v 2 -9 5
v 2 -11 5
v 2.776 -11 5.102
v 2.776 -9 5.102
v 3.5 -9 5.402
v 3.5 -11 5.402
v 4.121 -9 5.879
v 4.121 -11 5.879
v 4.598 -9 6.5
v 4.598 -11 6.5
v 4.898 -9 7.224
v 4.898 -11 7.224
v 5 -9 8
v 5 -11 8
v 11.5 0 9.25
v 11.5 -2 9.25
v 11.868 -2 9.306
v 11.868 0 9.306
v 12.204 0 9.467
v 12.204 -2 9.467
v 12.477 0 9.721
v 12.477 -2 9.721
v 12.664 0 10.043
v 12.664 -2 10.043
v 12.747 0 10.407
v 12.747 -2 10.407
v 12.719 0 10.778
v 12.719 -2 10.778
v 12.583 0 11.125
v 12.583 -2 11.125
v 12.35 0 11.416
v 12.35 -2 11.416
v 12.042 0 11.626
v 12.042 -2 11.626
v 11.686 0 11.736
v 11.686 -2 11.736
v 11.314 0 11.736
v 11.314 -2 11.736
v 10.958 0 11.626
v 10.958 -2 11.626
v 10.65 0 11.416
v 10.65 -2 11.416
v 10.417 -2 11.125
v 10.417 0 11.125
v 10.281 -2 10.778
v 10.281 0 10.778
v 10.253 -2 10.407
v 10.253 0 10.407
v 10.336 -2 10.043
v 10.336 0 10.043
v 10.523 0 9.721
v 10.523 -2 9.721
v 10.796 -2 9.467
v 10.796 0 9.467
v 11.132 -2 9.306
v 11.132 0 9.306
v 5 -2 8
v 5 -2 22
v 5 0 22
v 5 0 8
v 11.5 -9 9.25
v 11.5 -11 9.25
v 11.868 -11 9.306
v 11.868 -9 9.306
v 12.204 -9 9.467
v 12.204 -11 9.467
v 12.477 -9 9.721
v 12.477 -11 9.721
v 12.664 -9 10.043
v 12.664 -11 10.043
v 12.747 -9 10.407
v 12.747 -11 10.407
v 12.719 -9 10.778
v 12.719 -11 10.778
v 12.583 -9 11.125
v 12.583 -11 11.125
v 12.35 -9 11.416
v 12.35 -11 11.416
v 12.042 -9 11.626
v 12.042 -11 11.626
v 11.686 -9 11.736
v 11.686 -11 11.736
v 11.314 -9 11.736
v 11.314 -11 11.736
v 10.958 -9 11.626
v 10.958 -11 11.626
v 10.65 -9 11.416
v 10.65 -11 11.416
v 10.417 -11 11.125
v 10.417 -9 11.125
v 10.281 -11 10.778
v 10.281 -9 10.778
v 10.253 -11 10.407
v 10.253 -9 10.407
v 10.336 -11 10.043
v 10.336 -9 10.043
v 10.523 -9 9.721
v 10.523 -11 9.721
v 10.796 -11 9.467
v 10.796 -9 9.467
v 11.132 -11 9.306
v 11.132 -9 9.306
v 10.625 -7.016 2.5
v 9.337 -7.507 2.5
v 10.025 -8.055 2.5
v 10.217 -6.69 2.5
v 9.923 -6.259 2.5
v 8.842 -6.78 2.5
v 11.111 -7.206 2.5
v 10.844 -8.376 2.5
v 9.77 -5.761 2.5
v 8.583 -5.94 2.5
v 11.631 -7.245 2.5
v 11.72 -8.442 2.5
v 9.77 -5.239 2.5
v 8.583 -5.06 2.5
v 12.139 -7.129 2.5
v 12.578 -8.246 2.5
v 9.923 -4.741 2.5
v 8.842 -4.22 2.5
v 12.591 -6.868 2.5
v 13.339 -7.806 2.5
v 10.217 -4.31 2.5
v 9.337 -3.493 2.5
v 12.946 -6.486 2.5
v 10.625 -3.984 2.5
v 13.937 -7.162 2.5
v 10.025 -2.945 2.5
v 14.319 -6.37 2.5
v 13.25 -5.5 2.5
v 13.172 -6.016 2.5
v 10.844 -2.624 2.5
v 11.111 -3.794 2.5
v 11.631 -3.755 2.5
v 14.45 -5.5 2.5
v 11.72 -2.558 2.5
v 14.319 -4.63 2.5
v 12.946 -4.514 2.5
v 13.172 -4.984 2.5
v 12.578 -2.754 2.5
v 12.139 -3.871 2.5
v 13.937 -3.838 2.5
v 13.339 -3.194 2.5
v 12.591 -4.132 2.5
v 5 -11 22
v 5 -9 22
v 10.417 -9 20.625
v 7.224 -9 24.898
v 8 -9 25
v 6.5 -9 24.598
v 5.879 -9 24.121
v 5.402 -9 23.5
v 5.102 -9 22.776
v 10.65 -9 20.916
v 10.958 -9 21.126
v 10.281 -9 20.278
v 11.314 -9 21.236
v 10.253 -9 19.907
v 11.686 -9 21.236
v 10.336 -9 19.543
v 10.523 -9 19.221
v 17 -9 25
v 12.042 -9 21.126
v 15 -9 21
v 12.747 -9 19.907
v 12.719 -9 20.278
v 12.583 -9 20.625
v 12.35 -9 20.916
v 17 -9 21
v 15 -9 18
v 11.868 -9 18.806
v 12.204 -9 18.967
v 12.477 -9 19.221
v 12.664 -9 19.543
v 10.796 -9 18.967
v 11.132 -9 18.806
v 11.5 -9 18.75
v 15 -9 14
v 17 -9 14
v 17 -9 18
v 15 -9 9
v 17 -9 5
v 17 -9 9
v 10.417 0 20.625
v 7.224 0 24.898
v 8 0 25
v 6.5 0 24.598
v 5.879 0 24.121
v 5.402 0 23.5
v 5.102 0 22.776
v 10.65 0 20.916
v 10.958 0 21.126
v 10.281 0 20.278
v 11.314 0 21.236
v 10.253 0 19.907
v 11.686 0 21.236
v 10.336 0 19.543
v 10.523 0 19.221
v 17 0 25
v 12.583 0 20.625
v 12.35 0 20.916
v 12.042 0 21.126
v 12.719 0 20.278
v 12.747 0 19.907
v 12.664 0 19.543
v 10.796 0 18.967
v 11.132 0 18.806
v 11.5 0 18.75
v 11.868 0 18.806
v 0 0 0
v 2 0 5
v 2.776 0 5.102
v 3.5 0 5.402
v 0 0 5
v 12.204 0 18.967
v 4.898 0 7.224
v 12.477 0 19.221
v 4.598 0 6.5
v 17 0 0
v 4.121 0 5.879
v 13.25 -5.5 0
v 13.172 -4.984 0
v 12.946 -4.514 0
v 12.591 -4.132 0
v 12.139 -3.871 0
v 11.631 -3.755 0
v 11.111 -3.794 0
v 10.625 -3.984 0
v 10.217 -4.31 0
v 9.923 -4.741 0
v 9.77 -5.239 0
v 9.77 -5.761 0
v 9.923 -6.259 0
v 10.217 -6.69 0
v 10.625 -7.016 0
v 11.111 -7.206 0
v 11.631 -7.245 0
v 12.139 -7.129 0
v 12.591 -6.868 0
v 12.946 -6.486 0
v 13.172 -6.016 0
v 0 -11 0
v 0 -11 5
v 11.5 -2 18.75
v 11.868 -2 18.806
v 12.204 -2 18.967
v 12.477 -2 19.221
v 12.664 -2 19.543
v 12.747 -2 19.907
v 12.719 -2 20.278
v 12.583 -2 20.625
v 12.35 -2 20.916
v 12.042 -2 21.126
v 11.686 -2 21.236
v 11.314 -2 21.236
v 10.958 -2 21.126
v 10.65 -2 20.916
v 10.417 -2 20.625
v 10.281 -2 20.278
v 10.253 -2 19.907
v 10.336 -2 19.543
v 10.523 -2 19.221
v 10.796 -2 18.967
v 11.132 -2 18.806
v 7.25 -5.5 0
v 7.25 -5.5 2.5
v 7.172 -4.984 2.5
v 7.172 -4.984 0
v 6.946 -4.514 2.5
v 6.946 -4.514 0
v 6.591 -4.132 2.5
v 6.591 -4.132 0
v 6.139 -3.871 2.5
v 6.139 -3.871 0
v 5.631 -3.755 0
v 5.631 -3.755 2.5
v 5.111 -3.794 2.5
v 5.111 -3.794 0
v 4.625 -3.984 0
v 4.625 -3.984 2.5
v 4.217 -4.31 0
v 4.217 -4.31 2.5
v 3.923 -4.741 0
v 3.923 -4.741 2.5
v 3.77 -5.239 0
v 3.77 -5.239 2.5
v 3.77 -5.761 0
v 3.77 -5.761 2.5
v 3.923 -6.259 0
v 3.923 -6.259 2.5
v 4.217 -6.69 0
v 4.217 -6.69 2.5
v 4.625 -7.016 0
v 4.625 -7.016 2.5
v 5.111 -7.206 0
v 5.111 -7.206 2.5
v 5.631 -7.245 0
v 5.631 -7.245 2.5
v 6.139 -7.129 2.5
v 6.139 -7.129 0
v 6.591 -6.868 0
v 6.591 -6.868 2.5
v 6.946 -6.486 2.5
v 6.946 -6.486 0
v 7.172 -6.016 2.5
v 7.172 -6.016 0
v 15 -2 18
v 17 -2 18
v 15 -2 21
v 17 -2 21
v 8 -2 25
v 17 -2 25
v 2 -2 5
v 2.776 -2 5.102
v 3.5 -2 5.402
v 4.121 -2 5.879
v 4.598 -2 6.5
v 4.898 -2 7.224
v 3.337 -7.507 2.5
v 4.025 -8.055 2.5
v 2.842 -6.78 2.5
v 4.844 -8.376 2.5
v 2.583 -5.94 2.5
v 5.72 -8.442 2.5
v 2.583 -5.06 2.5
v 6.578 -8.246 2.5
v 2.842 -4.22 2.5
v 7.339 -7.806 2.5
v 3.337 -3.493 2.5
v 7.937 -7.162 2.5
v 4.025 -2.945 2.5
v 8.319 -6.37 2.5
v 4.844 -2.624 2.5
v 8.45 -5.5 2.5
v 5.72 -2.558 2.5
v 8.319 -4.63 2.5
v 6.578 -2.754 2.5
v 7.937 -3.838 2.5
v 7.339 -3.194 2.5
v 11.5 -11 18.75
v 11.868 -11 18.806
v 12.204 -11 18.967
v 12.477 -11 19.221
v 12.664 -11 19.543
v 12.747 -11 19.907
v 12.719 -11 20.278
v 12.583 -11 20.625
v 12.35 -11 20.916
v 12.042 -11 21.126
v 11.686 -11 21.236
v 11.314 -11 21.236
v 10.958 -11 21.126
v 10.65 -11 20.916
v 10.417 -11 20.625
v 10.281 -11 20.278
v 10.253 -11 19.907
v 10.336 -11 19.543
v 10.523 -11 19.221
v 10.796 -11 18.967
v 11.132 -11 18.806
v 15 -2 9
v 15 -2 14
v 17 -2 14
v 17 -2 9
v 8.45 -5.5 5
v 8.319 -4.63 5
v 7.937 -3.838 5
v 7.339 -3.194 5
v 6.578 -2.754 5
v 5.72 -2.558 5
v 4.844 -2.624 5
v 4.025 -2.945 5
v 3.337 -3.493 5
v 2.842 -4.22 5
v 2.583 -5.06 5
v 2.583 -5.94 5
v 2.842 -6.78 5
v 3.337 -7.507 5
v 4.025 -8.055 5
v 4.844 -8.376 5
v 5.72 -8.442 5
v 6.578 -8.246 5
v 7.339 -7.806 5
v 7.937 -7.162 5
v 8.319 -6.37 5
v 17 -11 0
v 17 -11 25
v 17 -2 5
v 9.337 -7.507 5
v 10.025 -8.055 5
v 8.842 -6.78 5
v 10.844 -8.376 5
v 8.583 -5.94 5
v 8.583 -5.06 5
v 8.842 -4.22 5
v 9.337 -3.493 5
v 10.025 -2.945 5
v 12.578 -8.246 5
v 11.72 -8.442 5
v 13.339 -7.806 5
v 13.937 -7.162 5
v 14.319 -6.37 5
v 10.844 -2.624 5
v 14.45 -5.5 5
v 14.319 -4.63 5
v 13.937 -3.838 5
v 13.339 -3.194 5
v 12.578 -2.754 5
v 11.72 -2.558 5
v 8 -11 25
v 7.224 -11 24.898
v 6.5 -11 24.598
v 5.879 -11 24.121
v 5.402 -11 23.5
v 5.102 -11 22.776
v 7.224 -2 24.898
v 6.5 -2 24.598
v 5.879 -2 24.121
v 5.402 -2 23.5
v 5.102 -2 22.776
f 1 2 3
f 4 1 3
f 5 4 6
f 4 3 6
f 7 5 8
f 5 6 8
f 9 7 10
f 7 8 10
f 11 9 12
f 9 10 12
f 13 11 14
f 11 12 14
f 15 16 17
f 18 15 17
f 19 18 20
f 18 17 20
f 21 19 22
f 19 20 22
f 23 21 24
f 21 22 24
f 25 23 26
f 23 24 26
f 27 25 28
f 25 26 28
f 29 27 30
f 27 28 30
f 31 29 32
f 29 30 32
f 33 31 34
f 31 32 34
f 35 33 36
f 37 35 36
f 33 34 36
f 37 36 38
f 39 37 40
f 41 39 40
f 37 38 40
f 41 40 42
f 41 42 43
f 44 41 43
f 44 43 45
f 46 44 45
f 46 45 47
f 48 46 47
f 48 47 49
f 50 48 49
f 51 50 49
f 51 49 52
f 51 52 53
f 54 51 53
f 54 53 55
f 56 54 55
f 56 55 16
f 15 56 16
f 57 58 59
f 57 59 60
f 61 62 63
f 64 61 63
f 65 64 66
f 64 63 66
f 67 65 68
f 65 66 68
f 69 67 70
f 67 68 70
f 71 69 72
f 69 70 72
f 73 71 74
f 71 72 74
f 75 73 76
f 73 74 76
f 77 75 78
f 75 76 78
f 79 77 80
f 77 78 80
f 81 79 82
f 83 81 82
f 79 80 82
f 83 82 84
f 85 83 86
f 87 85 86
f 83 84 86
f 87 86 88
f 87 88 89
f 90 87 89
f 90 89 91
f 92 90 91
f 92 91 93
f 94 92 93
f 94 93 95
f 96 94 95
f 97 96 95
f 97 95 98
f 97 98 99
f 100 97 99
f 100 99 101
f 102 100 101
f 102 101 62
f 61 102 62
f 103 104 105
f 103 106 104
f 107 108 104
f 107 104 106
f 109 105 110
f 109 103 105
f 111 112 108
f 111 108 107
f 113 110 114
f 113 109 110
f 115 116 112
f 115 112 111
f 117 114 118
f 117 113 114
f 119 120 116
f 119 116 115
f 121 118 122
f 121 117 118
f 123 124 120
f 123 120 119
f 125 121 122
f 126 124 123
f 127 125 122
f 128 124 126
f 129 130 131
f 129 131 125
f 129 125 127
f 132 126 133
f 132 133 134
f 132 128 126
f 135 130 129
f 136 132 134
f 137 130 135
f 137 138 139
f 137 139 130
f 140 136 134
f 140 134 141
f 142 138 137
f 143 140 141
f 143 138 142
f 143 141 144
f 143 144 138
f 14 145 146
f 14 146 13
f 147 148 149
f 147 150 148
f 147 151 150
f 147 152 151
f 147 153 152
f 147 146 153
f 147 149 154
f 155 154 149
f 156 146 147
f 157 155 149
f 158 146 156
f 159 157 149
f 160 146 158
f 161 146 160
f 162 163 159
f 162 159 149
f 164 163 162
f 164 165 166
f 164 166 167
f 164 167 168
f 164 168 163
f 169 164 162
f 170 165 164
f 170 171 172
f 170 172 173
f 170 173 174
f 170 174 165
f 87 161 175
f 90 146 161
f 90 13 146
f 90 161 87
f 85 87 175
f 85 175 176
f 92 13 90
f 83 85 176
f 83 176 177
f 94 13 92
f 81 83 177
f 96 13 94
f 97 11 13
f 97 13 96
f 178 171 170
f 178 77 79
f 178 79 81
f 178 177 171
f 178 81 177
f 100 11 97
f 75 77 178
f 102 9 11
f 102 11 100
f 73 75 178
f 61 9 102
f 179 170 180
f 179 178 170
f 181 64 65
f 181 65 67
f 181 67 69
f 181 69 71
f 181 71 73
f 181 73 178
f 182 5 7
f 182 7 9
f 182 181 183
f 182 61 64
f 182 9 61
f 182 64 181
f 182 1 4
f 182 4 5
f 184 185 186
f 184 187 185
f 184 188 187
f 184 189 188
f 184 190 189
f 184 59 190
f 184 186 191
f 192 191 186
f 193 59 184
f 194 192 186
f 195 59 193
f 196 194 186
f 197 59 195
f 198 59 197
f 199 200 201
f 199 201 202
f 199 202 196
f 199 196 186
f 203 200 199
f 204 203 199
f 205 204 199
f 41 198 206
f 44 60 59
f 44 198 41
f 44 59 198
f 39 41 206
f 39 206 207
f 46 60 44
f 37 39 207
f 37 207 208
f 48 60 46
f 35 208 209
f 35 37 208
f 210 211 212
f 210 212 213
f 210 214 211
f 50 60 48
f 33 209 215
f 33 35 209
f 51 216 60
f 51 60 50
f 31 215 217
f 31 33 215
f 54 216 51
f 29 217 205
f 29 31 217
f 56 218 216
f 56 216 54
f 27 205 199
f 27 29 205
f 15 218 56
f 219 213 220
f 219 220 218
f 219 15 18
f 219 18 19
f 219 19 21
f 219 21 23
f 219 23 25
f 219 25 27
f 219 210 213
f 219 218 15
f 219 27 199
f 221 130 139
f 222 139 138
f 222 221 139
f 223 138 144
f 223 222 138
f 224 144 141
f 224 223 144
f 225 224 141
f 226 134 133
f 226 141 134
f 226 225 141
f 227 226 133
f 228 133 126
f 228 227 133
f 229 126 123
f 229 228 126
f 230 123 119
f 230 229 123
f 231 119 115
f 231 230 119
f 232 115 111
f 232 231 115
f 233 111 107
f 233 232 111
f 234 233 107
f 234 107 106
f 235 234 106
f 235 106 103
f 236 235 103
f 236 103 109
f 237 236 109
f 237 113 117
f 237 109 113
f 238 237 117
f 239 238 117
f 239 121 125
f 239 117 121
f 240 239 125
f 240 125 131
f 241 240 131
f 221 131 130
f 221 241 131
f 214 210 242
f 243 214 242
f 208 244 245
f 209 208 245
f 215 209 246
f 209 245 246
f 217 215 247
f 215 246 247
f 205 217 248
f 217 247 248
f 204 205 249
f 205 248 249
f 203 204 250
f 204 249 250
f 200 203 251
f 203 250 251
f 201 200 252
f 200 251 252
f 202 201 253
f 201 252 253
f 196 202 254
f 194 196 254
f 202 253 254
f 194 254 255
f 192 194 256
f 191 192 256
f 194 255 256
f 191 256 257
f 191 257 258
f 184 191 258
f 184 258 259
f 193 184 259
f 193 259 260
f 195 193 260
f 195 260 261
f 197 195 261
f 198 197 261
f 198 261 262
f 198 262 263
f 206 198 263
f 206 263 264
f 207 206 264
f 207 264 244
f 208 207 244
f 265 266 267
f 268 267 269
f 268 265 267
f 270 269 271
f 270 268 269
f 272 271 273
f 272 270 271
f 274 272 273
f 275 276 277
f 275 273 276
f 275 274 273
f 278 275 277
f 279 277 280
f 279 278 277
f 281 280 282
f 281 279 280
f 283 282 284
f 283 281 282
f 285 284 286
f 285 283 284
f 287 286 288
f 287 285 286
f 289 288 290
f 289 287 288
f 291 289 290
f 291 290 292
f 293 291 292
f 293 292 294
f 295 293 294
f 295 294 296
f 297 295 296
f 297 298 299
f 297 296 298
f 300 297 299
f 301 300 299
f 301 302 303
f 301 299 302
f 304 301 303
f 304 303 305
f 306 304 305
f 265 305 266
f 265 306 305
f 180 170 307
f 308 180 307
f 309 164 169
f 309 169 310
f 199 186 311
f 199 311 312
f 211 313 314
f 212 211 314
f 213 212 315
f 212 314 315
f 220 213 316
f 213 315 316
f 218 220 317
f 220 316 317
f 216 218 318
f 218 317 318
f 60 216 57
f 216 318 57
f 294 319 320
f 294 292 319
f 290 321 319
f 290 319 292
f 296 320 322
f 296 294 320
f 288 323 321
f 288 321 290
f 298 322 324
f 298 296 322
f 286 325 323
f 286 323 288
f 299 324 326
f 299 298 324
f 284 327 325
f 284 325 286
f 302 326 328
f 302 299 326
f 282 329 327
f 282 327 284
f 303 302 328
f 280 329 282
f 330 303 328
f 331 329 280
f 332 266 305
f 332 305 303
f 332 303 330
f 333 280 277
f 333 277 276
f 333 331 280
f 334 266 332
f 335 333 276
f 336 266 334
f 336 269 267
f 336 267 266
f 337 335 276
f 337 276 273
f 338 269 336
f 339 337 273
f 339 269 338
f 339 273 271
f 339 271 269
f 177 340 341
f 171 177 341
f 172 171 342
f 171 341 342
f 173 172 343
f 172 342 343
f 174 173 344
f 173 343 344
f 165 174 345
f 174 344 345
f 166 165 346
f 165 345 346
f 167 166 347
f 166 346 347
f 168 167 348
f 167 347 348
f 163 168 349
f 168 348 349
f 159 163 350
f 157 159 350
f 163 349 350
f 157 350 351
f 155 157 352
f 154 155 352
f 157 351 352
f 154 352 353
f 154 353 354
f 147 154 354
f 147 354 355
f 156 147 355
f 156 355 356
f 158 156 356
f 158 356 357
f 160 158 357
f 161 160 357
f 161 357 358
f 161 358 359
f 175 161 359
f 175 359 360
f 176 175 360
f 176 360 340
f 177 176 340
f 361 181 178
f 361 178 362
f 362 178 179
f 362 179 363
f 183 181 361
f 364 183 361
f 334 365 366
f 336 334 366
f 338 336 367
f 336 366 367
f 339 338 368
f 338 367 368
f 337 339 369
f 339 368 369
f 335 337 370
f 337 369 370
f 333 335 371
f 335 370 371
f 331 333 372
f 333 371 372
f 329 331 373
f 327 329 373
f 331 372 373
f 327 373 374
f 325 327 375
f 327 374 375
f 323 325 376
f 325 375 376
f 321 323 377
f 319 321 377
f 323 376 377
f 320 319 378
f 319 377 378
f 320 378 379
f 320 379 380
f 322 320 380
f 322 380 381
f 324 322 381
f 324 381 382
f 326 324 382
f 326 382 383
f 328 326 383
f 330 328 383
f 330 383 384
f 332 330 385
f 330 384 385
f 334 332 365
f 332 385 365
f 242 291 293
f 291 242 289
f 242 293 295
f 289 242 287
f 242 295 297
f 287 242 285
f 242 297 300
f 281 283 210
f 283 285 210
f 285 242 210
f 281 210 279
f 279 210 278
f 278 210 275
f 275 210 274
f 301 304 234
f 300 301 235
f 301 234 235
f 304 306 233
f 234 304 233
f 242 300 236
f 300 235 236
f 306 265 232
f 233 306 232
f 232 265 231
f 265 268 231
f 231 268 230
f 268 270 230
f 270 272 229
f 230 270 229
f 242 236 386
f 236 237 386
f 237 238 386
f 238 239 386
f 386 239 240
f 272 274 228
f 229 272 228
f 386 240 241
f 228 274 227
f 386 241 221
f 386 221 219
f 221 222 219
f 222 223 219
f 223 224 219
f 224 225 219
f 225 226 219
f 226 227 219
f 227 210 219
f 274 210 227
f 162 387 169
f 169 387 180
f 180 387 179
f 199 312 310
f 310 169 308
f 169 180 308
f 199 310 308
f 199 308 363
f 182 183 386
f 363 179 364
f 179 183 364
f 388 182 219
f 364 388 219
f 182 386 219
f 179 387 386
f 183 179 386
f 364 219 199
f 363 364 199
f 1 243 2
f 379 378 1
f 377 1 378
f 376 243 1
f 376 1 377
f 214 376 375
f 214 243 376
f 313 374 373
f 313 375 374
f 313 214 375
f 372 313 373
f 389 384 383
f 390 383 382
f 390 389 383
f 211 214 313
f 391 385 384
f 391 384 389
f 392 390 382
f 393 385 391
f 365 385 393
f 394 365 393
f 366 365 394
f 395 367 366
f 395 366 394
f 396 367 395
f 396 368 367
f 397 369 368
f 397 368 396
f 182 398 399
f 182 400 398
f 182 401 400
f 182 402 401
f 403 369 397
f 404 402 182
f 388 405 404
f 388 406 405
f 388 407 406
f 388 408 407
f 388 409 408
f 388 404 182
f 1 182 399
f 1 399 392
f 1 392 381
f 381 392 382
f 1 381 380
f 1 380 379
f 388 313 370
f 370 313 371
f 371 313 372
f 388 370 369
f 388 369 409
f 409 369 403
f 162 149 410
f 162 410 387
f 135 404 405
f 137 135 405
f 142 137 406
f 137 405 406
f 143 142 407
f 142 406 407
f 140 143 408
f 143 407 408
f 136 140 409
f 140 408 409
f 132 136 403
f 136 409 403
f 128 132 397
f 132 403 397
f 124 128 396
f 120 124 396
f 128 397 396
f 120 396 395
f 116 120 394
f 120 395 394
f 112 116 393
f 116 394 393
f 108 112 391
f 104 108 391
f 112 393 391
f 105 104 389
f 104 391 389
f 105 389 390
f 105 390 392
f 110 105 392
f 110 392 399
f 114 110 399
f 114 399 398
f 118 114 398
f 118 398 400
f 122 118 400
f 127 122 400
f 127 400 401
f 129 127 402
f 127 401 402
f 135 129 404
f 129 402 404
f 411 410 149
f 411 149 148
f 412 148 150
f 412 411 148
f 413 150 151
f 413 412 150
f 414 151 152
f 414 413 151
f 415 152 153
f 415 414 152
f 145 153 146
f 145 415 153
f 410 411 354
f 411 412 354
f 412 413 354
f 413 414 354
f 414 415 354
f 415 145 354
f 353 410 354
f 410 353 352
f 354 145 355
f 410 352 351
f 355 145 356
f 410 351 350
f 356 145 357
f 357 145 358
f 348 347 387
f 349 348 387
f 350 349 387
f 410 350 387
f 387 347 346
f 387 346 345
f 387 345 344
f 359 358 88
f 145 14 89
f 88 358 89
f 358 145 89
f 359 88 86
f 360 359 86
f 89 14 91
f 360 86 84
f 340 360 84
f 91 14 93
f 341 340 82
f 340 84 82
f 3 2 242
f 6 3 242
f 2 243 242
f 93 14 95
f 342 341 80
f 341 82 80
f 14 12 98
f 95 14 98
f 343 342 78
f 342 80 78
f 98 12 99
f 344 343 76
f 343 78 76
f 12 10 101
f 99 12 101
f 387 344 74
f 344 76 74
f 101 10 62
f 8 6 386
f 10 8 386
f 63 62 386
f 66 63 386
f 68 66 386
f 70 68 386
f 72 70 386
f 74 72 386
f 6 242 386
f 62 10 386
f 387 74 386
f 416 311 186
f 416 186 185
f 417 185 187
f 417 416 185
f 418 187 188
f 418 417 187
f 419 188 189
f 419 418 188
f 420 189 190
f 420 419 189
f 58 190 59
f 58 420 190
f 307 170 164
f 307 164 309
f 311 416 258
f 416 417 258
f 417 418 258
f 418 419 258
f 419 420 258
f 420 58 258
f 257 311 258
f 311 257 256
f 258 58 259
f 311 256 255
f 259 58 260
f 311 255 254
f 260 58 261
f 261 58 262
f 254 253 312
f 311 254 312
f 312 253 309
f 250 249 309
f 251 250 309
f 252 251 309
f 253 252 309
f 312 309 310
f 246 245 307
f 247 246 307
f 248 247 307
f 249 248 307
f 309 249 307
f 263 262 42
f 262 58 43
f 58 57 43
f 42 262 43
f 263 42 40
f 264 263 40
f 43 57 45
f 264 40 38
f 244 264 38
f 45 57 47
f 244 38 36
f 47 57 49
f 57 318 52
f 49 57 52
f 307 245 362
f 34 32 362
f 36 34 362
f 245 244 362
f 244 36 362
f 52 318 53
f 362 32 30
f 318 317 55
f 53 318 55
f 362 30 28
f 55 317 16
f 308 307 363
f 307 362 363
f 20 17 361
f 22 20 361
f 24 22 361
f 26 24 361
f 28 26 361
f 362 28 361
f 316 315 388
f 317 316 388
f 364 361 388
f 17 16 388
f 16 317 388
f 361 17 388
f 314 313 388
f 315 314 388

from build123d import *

# Parameters (mm, degrees)
ESQUISSE1_W             = 17
ESQUISSE1_H             = 11
ESQUISSE1_R             = 1.75
BOSS_EXTRU_1_DEPTH      = 5
ESQUISSE2_W             = 2
ESQUISSE2_H             = 7
BOSS_EXTRU_2_DEPTH      = 20
ESQUISSE3_W             = 4
ESQUISSE3_H             = 7
ENL_V_MAT_EXTRU_1_DEPTH = 20
ESQUISSE4_R             = 1.25
ESQUISSE4_W             = 5
ESQUISSE4_H             = 20
ENL_V_MAT_EXTRU_2_DEPTH = 20
ESQUISSE5_R             = 2.95
ENL_V_MAT_EXTRU_3_DEPTH = 2.5
CONG_1_START            = -11
CONG_1_DEPTH            = 11
CONG_1_2_DEPTH          = 2
CONG_1_START_2          = -2
CONG_1_3_DEPTH          = 2


with BuildPart() as part:
    # Esquisse1 → Boss.-Extru.1 (new body)
    with BuildSketch(Plane.XY):
        with Locations((8.5, -5.5)):
            Rectangle(ESQUISSE1_W, ESQUISSE1_H)
        with Locations((5.5, -5.5)):
            Circle(ESQUISSE1_R, mode=Mode.SUBTRACT)
        with Locations((11.5, -5.5)):
            Circle(ESQUISSE1_R, mode=Mode.SUBTRACT)
    extrude(amount=BOSS_EXTRU_1_DEPTH)

    # Esquisse2 → Boss.-Extru.2 (add)
    with BuildSketch(Plane.XY.offset(5)):
        Polygon((15, -9), (0, -9), (0, -11), (17, -11), (17, -9), align=None)
        with Locations((16, -5.5)):
            Rectangle(ESQUISSE2_W, ESQUISSE2_H)
        Polygon((17, 0), (0, 0), (0, -2), (15, -2), (17, -2), align=None)
    extrude(amount=BOSS_EXTRU_2_DEPTH)

    # Esquisse3 → Enlèv. mat.-Extru.1 (cut)
    with BuildSketch(Plane.ZY.offset(-15)):
        with Locations((7, -5.5)):
            Rectangle(ESQUISSE3_W, ESQUISSE3_H)
        with Locations((23, -5.5)):
            Rectangle(ESQUISSE3_W, ESQUISSE3_H)
        with Locations((16, -5.5)):
            Rectangle(ESQUISSE3_W, ESQUISSE3_H)
    extrude(amount=-ENL_V_MAT_EXTRU_1_DEPTH, mode=Mode.SUBTRACT)

    # Esquisse4 → Enlèv. mat.-Extru.2 (cut)
    with BuildSketch(Plane(origin=(0, -11, 0), x_dir=(-1, 0, 0), z_dir=(0, -1, 0))):
        with Locations(Location((-11.5, -20, 0), (0, 0, 90))):
            Circle(ESQUISSE4_R)
        with Locations(Location((-11.5, -10.5, 0), (0, 0, 90))):
            Circle(ESQUISSE4_R)
        with Locations((-2.5, -15)):
            Rectangle(ESQUISSE4_W, ESQUISSE4_H)
    extrude(amount=-ENL_V_MAT_EXTRU_2_DEPTH, mode=Mode.SUBTRACT)

    # Esquisse5 → Enlèv. mat.-Extru.3 (cut)
    with BuildSketch(Plane.XY.offset(5)):
        with Locations((5.5, -5.5)):
            Circle(ESQUISSE5_R)
        with Locations((11.5, -5.5)):
            Circle(ESQUISSE5_R)
    extrude(amount=-ENL_V_MAT_EXTRU_3_DEPTH, mode=Mode.SUBTRACT)

    # Congé1: read off the stored shape, not the designer's step
    # Congé1 outline → Congé1 (cut)
    with BuildSketch(Plane(origin=(0, 0, 0), x_dir=(1, 0, 0), z_dir=(0, 1, 0)).offset(CONG_1_START)):
        with BuildLine():
            ThreePointArc((8, -25), (5.878679656, -24.121320344), (5, -22))
            Line((5, -22), (5, -25))
            Line((5, -25), (8, -25))
        make_face()
    extrude(amount=CONG_1_DEPTH, mode=Mode.SUBTRACT)

    # Cong_1 2 outline → Cong_1 2 (add)
    with BuildSketch(Plane(origin=(0, 0, 0), x_dir=(1, 0, 0), z_dir=(0, 1, 0)).offset(CONG_1_START)):
        with BuildLine():
            ThreePointArc((2, -5), (4.121320344, -5.878679656), (5, -8))
            Line((5, -8), (5, -5))
            Line((5, -5), (2, -5))
        make_face()
    extrude(amount=CONG_1_2_DEPTH)

    # Cong_1 3 outline → Cong_1 3 (add)
    with BuildSketch(Plane(origin=(0, 0, 0), x_dir=(1, 0, 0), z_dir=(0, 1, 0)).offset(CONG_1_START_2)):
        with BuildLine():
            ThreePointArc((2, -5), (4.121320344, -5.878679656), (5, -8))
            Line((5, -8), (5, -5))
            Line((5, -5), (2, -5))
        make_face()
    extrude(amount=CONG_1_3_DEPTH)


solid = part.part
